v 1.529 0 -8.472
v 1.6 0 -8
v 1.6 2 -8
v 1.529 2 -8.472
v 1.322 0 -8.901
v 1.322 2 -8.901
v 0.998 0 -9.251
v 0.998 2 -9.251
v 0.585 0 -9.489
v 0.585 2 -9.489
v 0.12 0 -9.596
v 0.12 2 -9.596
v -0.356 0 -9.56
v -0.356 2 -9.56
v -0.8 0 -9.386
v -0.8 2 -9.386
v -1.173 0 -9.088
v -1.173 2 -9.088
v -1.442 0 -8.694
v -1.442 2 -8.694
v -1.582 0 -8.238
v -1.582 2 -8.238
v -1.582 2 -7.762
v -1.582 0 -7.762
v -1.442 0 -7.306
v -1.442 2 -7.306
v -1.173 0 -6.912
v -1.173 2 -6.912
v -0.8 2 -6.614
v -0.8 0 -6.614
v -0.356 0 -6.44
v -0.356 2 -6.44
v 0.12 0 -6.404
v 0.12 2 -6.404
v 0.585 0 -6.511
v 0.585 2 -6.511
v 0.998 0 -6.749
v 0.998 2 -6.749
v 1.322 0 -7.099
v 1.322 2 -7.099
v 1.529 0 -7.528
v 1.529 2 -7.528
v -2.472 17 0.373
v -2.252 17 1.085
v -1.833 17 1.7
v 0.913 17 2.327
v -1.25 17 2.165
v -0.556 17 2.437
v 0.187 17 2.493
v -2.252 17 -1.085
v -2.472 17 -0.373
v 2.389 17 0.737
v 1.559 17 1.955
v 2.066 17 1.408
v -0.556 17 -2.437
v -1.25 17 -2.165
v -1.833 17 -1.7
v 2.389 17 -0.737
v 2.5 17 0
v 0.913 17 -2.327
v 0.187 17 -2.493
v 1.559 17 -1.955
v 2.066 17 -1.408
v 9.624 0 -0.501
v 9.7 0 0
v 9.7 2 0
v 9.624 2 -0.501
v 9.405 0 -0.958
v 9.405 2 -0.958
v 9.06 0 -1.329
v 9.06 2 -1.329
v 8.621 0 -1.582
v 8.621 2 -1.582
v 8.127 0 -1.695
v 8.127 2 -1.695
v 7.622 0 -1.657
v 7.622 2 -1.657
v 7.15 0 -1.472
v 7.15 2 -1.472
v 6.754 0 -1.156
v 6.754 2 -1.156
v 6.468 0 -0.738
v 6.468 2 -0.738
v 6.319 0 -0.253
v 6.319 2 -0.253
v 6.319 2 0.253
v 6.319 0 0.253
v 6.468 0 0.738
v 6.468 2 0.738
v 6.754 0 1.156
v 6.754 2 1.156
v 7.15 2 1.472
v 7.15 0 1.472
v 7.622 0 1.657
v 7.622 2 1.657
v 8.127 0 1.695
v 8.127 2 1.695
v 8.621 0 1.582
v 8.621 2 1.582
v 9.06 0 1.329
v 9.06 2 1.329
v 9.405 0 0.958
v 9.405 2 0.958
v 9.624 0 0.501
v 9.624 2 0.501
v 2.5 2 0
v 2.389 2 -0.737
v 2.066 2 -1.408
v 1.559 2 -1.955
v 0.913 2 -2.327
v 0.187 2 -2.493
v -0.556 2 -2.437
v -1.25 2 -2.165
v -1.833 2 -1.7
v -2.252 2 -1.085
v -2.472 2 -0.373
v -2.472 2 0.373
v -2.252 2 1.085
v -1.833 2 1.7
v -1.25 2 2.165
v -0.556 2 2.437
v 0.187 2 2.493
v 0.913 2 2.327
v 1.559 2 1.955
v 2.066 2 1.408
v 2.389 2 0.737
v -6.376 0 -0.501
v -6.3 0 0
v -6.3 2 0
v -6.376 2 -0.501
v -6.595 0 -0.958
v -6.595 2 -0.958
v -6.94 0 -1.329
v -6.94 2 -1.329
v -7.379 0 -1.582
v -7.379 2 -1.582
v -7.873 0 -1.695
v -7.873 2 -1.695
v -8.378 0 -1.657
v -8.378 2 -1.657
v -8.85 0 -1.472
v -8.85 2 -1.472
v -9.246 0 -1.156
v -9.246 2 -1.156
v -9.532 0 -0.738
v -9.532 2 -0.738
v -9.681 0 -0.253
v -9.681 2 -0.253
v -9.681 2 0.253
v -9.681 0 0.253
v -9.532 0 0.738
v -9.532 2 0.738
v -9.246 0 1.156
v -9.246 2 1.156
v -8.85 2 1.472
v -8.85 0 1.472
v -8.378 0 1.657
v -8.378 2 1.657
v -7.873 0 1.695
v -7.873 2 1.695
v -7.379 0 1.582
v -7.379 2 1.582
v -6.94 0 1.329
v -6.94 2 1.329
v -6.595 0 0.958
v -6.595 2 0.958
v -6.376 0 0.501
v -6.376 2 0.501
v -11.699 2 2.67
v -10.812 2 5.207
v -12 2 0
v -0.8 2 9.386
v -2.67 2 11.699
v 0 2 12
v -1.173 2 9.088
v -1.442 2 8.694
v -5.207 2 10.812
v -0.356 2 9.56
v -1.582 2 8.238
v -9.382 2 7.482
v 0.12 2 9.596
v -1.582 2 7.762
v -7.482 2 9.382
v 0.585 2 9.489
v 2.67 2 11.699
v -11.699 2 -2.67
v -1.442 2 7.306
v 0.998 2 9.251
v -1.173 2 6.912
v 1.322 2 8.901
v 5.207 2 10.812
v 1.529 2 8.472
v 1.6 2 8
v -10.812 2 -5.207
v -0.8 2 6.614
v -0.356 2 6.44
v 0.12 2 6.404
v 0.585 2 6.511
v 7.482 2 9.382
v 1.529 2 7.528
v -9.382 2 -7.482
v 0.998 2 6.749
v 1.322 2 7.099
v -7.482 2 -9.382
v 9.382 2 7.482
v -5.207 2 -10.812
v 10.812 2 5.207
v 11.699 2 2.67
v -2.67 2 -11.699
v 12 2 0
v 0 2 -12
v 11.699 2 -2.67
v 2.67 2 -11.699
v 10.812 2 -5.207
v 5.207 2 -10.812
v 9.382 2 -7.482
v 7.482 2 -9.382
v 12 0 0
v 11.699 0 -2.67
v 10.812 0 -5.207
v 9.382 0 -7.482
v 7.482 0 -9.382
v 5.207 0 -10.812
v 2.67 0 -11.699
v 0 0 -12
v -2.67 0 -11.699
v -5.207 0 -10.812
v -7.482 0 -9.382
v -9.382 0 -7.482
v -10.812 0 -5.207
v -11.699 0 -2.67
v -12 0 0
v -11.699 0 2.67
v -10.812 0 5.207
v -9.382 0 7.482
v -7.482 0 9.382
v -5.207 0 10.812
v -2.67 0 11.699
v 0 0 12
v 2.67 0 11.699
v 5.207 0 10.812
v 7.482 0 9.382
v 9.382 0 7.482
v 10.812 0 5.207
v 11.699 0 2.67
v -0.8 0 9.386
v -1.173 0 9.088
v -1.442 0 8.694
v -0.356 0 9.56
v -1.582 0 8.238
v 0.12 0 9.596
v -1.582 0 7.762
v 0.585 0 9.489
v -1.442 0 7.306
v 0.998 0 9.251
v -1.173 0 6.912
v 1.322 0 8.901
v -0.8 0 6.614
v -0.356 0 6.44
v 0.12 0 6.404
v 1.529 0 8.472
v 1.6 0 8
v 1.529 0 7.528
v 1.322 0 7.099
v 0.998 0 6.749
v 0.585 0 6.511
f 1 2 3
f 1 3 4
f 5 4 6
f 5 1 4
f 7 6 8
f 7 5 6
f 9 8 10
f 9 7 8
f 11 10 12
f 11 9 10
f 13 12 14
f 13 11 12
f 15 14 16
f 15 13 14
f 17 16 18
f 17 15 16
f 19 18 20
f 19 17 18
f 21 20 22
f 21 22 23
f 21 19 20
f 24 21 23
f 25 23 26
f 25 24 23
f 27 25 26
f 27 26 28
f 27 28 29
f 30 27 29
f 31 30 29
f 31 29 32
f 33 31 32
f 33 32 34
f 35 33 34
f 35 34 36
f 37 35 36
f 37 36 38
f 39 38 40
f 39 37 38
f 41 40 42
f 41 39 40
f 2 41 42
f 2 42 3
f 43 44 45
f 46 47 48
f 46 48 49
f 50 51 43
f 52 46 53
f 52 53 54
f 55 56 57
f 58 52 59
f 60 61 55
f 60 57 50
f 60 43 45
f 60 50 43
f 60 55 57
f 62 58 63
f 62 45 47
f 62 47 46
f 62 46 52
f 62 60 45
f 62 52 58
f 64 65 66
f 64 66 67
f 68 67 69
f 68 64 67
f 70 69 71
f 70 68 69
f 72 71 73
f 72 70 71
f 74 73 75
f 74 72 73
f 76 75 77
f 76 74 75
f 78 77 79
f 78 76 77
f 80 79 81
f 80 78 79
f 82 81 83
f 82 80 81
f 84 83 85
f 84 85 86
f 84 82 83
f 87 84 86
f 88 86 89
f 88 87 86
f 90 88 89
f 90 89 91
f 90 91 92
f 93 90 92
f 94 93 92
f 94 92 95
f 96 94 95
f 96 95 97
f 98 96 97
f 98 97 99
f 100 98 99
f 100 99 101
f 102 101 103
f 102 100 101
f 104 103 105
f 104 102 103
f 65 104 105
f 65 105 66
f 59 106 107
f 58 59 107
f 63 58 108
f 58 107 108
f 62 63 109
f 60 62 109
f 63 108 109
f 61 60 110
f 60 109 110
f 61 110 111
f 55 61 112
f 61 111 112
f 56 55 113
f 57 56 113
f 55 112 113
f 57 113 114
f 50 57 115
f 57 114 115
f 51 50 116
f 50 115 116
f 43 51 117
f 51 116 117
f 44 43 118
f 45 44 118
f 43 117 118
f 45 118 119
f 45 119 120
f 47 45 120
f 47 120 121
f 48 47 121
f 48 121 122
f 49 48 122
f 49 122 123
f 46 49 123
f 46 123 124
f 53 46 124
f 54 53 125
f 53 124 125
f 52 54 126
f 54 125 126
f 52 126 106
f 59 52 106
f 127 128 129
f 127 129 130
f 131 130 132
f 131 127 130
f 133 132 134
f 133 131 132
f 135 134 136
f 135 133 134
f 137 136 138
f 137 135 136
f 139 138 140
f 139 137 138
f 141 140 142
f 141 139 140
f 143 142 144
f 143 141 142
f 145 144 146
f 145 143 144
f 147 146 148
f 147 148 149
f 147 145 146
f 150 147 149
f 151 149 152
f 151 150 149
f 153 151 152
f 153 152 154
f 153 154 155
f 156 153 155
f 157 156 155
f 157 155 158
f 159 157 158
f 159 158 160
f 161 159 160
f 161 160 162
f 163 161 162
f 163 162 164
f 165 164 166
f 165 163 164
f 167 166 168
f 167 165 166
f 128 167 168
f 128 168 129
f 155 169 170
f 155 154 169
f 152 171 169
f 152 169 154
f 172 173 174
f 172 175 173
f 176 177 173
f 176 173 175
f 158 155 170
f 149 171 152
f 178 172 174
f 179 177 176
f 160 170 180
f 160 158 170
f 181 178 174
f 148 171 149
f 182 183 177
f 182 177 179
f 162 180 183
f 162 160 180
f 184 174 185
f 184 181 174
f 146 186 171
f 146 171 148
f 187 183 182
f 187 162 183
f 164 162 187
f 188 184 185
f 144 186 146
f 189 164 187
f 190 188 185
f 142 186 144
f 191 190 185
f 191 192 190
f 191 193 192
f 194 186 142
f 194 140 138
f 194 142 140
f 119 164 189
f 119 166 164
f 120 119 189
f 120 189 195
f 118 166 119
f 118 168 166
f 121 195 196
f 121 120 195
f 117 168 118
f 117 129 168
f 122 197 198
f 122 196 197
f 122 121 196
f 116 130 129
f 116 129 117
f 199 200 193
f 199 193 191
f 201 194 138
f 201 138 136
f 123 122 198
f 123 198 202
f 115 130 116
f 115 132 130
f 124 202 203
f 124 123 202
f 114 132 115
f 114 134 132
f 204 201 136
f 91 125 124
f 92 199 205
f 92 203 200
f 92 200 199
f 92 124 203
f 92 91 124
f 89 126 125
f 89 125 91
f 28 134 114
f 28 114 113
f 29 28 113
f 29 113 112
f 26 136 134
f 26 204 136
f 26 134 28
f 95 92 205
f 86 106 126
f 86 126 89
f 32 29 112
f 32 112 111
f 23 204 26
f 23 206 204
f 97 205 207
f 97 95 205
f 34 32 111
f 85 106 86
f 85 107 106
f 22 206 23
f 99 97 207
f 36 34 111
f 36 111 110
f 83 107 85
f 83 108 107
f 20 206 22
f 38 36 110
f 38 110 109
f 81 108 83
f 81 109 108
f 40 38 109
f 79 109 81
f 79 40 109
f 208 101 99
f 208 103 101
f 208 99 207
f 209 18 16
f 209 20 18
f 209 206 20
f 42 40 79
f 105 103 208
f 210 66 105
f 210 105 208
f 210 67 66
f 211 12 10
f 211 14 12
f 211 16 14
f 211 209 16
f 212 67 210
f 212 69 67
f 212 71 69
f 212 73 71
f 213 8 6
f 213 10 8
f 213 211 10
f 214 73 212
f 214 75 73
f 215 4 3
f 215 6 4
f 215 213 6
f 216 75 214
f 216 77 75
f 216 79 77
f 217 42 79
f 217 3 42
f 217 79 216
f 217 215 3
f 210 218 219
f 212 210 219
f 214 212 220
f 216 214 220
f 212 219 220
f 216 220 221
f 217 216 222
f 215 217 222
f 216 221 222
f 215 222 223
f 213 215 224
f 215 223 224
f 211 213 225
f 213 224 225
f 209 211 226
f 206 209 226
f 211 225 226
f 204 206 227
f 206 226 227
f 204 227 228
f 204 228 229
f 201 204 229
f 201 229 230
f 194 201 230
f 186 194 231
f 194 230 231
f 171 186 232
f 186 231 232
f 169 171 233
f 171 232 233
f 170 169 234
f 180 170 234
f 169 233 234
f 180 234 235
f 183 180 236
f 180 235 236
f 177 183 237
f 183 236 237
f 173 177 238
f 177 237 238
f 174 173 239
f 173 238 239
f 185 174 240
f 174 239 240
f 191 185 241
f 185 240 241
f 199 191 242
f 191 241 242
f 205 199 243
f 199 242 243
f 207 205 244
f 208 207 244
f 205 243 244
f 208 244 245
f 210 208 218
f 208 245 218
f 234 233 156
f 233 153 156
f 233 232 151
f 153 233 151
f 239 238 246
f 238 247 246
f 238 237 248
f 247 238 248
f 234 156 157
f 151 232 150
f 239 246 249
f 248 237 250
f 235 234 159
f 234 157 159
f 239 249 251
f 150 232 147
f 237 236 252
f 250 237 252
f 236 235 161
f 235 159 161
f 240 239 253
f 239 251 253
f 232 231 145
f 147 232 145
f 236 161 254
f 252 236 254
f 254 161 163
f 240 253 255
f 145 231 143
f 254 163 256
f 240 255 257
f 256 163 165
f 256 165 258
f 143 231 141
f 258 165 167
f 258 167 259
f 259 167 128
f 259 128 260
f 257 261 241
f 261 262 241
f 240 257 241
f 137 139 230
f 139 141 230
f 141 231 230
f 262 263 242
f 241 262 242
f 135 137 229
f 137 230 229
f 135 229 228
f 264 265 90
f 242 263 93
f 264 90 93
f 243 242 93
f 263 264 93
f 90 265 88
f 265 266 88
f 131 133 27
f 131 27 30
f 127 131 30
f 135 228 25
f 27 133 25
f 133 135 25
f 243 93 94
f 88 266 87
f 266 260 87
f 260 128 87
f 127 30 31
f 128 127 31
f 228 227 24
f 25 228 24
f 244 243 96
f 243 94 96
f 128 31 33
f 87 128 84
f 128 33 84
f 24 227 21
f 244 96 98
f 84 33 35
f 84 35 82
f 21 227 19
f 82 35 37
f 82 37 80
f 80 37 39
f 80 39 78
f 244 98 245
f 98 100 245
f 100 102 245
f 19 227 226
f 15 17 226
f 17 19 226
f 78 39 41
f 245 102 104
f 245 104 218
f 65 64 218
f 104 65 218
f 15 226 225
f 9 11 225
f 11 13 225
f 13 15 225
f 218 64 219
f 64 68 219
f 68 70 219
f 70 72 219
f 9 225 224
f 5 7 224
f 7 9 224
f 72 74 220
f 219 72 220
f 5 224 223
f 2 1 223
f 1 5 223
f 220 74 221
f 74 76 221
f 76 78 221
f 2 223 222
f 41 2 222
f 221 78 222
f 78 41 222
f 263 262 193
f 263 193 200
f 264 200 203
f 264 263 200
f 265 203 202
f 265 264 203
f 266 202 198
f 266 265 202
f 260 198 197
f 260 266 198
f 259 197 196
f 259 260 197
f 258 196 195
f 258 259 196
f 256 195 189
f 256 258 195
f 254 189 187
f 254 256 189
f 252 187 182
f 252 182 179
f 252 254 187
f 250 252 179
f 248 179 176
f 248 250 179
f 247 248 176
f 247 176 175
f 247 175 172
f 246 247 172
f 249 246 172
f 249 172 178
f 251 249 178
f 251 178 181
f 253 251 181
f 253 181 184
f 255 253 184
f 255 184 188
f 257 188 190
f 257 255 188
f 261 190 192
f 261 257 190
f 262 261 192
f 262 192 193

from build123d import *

# Parameters (mm, degrees)
SKETCH_1_R      = 12
SKETCH_1_R_2    = 1.7
SKETCH_1_R_3    = 1.6
EXTRUDE_1_DEPTH = 2
SKETCH_2_R      = 2.5
EXTRUDE_2_DEPTH = 15


with BuildPart() as part:
    # 草图1 → 凸台-拉伸1 (new body)
    with BuildSketch(Plane(origin=(0, 0, 0), x_dir=(1, 0, 0), z_dir=(0, 1, 0))):
        Circle(SKETCH_1_R)
        with Locations((-8, 0)):
            Circle(SKETCH_1_R_2, mode=Mode.SUBTRACT)
        with Locations((0, 8)):
            Circle(SKETCH_1_R_3, mode=Mode.SUBTRACT)
        with Locations((8, 0)):
            Circle(SKETCH_1_R_2, mode=Mode.SUBTRACT)
        with Locations((0, -8)):
            Circle(SKETCH_1_R_3, mode=Mode.SUBTRACT)
    extrude(amount=EXTRUDE_1_DEPTH)

    # 草图2 → 凸台-拉伸2 (add)
    with BuildSketch(Plane(origin=(0, 2, 0), x_dir=(1, 0, 0), z_dir=(0, 1, 0))):
        Circle(SKETCH_2_R)
    extrude(amount=EXTRUDE_2_DEPTH)


solid = part.part
